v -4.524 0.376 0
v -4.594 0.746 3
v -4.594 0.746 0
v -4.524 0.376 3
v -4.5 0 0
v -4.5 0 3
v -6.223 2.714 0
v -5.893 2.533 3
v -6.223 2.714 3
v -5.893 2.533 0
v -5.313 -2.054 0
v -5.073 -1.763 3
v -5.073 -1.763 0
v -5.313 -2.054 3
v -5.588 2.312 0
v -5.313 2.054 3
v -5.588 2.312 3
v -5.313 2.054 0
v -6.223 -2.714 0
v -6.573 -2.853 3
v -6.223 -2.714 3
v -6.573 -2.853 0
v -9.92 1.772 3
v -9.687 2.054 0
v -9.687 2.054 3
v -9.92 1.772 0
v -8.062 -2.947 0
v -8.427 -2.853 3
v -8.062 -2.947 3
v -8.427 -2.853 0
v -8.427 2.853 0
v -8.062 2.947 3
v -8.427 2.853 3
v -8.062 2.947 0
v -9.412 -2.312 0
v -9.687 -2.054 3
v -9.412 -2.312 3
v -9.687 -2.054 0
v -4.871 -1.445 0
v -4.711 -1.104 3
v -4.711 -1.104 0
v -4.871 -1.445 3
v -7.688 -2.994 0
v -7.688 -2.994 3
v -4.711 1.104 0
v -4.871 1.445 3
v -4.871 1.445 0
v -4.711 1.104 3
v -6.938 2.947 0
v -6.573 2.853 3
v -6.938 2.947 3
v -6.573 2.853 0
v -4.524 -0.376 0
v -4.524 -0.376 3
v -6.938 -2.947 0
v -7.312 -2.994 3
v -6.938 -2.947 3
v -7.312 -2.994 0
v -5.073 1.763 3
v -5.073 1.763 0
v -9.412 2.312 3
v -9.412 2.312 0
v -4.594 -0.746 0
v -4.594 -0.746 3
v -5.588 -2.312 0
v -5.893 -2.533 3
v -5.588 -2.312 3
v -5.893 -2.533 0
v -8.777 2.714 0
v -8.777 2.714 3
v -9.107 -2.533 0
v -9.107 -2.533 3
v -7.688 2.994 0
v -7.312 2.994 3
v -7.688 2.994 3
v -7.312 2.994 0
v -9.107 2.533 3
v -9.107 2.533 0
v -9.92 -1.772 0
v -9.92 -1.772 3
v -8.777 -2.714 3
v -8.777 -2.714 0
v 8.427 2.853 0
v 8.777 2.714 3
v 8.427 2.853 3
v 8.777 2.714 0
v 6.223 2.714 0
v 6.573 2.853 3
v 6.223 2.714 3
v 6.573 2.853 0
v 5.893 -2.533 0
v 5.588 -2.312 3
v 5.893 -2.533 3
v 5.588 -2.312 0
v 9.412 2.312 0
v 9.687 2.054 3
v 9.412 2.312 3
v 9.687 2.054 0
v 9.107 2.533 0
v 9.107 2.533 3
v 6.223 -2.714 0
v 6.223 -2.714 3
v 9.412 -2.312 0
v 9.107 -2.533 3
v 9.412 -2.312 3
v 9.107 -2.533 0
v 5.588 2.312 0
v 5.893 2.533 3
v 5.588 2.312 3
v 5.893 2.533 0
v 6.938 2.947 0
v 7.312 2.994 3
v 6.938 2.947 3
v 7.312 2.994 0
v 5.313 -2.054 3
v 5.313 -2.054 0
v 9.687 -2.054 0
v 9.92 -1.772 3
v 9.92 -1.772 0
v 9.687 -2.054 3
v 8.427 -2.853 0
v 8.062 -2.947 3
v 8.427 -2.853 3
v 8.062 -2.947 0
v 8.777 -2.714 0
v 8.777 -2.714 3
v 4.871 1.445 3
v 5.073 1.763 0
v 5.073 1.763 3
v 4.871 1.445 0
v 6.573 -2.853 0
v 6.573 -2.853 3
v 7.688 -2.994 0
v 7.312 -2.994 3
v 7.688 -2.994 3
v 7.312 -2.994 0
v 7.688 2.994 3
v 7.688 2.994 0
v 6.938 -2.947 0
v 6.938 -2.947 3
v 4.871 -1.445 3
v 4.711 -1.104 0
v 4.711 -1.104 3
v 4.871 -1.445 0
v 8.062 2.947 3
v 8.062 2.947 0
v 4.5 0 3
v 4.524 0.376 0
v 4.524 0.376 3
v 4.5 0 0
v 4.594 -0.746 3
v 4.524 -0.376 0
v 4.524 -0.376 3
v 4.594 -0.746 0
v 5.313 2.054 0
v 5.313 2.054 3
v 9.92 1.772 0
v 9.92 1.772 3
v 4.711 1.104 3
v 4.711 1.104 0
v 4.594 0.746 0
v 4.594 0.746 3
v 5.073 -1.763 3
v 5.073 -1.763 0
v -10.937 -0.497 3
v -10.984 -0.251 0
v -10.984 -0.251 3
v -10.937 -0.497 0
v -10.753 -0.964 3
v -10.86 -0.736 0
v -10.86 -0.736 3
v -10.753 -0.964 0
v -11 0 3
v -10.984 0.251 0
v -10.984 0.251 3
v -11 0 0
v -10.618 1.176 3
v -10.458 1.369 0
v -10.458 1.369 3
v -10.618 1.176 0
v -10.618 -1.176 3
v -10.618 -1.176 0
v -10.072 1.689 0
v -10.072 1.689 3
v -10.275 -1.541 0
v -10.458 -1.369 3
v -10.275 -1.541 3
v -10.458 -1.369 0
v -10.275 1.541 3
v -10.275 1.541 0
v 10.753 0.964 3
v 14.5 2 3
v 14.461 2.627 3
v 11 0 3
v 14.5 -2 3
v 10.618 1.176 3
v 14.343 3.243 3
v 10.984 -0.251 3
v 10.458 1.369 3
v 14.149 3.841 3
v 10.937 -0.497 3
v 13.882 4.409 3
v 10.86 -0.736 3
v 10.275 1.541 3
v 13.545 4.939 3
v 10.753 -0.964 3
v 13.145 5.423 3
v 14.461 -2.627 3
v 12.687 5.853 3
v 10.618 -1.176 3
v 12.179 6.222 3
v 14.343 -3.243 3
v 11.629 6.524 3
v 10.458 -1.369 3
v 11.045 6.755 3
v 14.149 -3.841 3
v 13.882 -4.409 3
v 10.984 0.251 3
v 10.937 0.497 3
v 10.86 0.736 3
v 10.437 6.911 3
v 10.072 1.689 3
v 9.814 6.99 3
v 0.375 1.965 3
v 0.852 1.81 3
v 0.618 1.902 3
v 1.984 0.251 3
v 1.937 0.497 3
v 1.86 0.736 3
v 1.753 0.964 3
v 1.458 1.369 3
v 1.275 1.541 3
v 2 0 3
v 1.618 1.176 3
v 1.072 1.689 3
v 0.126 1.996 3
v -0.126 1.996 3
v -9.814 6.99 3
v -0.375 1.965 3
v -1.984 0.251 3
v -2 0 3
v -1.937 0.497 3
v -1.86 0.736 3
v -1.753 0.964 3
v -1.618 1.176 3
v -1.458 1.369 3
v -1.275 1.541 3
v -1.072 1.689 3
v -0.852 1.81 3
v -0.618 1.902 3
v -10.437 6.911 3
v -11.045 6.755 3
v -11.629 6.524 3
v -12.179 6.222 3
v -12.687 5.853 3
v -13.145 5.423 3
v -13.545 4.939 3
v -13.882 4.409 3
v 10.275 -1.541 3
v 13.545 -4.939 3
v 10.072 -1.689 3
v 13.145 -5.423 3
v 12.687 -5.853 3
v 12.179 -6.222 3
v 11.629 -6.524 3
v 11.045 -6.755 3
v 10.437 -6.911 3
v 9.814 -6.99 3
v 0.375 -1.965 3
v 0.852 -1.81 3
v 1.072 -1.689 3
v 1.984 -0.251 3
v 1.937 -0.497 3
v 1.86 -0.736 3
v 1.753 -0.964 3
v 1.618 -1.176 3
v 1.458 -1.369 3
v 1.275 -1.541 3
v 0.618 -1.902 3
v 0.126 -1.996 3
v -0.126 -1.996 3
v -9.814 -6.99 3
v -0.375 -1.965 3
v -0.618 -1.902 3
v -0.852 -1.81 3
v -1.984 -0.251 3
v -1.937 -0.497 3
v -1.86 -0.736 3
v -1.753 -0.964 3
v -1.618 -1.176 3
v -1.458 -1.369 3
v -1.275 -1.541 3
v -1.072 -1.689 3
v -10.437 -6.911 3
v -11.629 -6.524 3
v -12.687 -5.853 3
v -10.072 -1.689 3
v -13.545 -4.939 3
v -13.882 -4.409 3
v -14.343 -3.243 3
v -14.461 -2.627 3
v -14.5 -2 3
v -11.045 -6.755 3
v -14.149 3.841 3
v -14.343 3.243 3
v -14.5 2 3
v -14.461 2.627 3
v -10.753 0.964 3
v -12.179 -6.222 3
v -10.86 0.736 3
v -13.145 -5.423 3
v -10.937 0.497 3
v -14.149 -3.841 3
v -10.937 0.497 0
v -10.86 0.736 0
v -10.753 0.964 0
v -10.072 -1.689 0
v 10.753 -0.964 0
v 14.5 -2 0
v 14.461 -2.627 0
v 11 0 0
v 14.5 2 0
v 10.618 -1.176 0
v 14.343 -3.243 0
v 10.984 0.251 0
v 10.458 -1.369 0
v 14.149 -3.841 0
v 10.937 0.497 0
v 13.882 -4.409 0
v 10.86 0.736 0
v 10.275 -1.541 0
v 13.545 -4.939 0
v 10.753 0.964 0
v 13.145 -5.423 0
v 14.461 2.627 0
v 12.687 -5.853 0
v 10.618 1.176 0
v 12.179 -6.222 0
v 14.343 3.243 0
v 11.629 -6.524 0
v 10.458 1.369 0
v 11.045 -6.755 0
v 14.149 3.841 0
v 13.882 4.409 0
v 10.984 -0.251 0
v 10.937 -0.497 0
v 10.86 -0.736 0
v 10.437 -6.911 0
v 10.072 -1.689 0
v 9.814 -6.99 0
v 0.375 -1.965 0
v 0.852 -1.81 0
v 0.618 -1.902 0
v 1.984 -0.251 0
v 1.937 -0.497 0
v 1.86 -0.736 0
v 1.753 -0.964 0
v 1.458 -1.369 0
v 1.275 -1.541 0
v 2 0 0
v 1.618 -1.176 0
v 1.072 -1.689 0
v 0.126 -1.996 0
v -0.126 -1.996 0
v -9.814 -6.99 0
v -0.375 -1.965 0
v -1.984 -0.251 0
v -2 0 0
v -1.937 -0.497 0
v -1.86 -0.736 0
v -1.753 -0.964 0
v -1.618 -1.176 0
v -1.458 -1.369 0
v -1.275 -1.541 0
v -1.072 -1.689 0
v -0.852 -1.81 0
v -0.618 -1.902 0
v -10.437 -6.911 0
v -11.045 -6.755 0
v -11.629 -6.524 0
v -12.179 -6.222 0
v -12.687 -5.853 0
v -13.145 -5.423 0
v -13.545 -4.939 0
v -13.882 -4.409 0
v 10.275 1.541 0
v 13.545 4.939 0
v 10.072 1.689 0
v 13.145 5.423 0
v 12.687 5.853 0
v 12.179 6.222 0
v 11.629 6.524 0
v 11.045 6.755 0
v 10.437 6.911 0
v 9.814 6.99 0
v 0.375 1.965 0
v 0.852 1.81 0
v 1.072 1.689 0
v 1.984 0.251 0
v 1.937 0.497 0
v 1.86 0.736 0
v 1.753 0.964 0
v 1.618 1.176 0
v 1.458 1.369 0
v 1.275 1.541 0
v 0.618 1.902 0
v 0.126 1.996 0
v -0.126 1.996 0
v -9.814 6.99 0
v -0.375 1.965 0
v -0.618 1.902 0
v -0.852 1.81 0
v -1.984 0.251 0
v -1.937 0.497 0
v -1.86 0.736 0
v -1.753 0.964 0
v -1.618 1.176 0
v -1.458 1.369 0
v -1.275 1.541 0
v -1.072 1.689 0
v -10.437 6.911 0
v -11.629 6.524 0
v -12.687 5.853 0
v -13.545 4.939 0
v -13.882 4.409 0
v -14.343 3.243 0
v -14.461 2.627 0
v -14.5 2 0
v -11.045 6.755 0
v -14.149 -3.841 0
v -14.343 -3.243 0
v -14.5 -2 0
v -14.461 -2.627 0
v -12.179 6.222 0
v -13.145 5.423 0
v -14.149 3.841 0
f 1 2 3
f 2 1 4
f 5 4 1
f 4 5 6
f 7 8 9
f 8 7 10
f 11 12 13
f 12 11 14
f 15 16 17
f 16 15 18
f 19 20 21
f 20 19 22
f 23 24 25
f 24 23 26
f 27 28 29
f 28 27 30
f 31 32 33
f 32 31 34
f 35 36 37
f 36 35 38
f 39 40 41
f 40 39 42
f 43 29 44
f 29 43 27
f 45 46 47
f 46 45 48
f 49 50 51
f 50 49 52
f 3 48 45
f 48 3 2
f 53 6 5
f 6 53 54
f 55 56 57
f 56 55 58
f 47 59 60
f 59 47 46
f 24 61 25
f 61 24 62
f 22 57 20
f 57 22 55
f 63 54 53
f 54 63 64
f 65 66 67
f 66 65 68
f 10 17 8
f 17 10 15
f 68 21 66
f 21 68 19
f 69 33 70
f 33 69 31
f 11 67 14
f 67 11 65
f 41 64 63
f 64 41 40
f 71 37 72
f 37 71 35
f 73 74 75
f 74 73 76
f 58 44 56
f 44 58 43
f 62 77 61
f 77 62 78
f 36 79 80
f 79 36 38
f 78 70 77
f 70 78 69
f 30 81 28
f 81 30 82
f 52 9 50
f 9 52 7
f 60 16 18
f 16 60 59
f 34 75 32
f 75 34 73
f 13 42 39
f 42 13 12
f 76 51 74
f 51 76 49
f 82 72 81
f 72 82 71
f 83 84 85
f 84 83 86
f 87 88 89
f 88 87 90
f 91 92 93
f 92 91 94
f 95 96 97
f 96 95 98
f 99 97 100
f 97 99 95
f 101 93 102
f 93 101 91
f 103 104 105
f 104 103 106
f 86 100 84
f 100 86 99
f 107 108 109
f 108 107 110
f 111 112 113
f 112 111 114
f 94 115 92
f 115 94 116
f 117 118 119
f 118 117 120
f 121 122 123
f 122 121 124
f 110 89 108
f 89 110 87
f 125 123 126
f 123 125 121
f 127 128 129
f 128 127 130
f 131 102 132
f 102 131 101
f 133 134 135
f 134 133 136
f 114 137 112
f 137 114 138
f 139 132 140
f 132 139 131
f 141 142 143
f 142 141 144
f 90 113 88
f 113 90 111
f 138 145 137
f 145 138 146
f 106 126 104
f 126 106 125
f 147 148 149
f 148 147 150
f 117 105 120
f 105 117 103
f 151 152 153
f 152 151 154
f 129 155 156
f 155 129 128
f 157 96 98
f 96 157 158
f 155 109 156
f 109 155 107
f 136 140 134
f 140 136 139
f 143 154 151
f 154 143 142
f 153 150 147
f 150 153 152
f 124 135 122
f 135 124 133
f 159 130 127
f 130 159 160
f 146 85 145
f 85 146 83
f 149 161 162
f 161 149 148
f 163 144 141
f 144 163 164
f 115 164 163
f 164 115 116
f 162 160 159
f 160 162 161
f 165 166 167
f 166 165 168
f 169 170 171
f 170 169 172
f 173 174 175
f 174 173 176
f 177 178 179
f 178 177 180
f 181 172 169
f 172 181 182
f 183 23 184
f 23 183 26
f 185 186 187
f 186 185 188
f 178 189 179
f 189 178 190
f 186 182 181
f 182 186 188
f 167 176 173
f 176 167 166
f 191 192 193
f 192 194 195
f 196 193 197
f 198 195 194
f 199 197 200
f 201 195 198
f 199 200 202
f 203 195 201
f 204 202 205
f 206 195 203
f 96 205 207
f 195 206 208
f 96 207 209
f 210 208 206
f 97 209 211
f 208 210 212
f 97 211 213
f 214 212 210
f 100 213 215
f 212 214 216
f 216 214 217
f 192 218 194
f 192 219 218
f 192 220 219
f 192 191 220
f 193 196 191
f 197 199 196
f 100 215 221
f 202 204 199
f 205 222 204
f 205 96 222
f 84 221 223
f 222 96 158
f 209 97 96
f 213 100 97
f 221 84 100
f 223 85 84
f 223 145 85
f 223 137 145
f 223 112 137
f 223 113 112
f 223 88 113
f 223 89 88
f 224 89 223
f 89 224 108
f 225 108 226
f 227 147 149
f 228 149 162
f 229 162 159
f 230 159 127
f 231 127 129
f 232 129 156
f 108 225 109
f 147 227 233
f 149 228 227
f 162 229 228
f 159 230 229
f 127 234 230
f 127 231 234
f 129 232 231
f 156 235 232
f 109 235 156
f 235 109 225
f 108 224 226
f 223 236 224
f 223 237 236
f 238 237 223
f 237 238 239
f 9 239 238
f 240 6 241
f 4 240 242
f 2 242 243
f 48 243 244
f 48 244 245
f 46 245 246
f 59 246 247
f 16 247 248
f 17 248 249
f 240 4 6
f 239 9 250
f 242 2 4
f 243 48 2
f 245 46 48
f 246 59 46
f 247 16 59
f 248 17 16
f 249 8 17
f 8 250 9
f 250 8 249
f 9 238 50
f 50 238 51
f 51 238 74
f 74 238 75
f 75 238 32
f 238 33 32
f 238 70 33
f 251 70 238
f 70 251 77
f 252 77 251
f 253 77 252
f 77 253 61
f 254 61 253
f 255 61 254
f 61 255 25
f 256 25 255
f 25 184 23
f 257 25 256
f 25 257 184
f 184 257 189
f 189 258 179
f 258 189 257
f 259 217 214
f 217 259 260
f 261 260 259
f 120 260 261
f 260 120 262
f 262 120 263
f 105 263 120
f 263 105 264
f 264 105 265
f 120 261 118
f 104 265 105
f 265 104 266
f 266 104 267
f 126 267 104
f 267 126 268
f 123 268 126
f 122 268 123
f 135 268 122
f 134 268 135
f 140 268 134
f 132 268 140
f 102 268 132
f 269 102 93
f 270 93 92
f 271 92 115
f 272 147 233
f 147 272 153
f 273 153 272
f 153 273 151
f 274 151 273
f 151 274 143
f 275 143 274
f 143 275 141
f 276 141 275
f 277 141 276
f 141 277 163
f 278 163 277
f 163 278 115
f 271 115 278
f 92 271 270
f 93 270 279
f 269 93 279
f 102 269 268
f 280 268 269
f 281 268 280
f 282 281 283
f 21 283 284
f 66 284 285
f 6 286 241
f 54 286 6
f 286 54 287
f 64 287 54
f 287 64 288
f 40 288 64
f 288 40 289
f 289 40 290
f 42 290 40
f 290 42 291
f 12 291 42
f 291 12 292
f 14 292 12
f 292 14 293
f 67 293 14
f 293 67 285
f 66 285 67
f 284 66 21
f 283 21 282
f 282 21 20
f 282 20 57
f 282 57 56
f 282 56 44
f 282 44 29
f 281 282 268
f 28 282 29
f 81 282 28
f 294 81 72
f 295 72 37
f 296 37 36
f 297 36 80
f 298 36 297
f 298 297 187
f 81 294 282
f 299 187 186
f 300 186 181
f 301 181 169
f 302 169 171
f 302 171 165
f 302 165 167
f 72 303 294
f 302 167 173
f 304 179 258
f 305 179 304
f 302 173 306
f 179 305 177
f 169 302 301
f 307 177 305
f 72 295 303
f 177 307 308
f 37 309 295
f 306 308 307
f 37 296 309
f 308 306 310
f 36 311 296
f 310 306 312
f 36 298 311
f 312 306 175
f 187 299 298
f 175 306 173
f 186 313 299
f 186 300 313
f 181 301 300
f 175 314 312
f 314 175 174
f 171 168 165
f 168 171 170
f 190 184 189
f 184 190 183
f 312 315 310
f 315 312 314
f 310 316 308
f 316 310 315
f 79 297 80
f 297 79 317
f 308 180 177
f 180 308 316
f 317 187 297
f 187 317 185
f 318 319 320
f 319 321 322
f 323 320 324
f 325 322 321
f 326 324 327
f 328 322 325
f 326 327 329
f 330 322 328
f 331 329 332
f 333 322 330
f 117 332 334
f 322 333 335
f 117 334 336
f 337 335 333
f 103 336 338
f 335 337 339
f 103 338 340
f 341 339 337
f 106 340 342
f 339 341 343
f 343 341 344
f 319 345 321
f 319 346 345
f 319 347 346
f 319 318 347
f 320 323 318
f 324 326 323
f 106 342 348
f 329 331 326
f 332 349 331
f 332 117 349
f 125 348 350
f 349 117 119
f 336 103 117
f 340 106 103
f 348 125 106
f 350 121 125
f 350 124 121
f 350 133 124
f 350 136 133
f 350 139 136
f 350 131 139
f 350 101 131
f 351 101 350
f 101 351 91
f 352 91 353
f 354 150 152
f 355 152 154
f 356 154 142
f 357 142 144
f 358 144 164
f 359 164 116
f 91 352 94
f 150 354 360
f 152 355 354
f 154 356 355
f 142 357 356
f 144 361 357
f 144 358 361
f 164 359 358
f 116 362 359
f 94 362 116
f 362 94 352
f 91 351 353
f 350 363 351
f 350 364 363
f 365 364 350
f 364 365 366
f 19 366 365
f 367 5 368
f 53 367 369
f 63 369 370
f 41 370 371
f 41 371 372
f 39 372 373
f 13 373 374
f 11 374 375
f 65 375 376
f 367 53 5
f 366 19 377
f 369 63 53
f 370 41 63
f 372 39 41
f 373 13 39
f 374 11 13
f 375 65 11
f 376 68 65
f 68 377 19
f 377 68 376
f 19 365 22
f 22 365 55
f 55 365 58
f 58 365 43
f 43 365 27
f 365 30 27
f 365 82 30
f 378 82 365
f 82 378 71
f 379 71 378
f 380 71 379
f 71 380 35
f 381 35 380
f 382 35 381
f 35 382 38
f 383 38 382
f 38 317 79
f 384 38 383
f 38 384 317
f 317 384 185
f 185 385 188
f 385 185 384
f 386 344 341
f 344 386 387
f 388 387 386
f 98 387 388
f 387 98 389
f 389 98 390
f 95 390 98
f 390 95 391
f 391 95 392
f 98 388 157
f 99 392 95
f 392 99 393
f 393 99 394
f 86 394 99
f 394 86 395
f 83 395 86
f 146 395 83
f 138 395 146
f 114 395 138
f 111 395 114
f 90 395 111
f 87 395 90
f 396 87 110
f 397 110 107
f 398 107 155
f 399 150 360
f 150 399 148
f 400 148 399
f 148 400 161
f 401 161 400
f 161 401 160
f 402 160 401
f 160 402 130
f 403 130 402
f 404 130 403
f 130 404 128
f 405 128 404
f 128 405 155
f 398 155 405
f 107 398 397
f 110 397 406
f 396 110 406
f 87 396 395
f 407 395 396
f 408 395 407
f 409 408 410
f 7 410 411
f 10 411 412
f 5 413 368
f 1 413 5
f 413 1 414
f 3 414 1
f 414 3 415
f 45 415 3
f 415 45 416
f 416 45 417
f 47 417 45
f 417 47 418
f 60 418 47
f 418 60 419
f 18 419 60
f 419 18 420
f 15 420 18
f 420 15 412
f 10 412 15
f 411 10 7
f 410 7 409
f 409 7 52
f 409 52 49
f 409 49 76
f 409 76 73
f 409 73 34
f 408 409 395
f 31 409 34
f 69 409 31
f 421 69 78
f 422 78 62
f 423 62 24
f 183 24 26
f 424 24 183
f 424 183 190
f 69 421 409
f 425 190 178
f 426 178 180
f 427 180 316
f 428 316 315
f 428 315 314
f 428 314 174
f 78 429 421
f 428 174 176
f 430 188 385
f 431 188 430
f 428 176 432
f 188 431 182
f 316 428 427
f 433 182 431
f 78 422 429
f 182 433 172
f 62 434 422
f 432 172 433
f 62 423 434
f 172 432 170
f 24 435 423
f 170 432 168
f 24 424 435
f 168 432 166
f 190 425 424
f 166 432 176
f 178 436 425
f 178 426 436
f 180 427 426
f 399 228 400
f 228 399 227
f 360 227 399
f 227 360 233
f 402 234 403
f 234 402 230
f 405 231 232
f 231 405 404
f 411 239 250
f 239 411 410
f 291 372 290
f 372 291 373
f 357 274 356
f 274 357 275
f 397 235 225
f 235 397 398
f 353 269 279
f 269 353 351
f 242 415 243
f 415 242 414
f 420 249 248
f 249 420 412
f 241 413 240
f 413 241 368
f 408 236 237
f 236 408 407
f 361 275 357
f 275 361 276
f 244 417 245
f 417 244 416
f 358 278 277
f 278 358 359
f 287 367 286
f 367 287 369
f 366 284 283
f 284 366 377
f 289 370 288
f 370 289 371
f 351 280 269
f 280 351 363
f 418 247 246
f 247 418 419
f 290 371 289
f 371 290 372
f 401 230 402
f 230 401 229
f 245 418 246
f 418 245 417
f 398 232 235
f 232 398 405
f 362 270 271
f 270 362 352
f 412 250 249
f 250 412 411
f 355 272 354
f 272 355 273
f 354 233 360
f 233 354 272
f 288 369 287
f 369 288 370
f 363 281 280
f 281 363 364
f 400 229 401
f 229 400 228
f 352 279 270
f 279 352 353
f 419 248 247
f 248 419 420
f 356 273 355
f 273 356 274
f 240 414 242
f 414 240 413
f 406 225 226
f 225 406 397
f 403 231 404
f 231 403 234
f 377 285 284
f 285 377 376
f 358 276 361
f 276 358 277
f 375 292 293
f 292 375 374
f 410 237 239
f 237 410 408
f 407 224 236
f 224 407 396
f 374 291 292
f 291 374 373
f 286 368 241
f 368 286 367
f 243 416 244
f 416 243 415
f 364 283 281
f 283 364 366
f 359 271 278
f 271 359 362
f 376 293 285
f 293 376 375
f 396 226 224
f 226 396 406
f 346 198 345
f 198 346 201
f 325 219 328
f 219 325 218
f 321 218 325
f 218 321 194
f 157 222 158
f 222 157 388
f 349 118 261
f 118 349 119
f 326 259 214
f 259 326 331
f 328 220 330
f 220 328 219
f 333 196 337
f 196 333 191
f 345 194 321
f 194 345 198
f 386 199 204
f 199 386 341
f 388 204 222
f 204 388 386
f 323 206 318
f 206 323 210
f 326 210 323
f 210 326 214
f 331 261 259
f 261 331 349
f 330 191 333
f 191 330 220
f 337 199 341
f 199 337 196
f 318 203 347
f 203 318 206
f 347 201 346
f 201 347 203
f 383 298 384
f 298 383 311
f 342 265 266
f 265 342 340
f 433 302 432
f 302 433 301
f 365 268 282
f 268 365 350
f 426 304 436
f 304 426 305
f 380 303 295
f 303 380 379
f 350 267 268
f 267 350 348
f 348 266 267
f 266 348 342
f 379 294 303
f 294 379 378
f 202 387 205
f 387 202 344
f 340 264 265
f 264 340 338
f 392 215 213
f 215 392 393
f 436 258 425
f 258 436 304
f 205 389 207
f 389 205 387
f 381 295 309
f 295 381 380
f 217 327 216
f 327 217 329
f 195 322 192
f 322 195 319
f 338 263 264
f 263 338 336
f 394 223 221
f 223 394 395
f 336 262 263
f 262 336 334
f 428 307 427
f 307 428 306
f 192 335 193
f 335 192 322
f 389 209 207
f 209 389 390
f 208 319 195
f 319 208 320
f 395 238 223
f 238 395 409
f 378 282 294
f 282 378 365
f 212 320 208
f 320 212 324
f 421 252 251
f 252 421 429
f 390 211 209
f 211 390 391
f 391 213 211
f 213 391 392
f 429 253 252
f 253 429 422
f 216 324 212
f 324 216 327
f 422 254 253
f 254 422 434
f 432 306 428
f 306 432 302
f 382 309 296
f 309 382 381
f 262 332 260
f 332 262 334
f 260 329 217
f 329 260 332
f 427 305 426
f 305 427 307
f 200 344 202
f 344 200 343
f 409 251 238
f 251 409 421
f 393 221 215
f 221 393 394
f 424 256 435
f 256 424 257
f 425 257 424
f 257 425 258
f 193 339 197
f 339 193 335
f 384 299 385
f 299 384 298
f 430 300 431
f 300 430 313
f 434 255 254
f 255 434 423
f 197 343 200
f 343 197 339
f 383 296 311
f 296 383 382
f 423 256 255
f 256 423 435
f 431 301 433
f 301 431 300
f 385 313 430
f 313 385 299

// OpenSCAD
$fn = 50;


difference() {
	union() {
		hull() {
			translate(v = [-9.5000000000, 2.0000000000, 0]) {
				cylinder(h = 3, r = 5);
			}
			translate(v = [9.5000000000, 2.0000000000, 0]) {
				cylinder(h = 3, r = 5);
			}
			translate(v = [-9.5000000000, -2.0000000000, 0]) {
				cylinder(h = 3, r = 5);
			}
			translate(v = [9.5000000000, -2.0000000000, 0]) {
				cylinder(h = 3, r = 5);
			}
		}
	}
	union() {
		#translate(v = [-7.5000000000, 0.0000000000, -100.0000000000]) {
			cylinder(h = 200, r = 3.0000000000);
		}
		#translate(v = [-7.5000000000, 0.0000000000, -100.0000000000]) {
			cylinder(h = 200, r = 3.0000000000);
		}
		#translate(v = [7.5000000000, 0.0000000000, -100.0000000000]) {
			cylinder(h = 200, r = 3.0000000000);
		}
		#translate(v = [7.5000000000, 0.0000000000, -100.0000000000]) {
			cylinder(h = 200, r = 3.0000000000);
		}
		#translate(v = [-9.0000000000, 0, 0]) {
			cylinder(h = 3, r = 2.0000000000);
		}
		#cylinder(h = 3, r = 2.0000000000);
		#translate(v = [9.0000000000, 0, 0]) {
			cylinder(h = 3, r = 2.0000000000);
		}
	}
}
